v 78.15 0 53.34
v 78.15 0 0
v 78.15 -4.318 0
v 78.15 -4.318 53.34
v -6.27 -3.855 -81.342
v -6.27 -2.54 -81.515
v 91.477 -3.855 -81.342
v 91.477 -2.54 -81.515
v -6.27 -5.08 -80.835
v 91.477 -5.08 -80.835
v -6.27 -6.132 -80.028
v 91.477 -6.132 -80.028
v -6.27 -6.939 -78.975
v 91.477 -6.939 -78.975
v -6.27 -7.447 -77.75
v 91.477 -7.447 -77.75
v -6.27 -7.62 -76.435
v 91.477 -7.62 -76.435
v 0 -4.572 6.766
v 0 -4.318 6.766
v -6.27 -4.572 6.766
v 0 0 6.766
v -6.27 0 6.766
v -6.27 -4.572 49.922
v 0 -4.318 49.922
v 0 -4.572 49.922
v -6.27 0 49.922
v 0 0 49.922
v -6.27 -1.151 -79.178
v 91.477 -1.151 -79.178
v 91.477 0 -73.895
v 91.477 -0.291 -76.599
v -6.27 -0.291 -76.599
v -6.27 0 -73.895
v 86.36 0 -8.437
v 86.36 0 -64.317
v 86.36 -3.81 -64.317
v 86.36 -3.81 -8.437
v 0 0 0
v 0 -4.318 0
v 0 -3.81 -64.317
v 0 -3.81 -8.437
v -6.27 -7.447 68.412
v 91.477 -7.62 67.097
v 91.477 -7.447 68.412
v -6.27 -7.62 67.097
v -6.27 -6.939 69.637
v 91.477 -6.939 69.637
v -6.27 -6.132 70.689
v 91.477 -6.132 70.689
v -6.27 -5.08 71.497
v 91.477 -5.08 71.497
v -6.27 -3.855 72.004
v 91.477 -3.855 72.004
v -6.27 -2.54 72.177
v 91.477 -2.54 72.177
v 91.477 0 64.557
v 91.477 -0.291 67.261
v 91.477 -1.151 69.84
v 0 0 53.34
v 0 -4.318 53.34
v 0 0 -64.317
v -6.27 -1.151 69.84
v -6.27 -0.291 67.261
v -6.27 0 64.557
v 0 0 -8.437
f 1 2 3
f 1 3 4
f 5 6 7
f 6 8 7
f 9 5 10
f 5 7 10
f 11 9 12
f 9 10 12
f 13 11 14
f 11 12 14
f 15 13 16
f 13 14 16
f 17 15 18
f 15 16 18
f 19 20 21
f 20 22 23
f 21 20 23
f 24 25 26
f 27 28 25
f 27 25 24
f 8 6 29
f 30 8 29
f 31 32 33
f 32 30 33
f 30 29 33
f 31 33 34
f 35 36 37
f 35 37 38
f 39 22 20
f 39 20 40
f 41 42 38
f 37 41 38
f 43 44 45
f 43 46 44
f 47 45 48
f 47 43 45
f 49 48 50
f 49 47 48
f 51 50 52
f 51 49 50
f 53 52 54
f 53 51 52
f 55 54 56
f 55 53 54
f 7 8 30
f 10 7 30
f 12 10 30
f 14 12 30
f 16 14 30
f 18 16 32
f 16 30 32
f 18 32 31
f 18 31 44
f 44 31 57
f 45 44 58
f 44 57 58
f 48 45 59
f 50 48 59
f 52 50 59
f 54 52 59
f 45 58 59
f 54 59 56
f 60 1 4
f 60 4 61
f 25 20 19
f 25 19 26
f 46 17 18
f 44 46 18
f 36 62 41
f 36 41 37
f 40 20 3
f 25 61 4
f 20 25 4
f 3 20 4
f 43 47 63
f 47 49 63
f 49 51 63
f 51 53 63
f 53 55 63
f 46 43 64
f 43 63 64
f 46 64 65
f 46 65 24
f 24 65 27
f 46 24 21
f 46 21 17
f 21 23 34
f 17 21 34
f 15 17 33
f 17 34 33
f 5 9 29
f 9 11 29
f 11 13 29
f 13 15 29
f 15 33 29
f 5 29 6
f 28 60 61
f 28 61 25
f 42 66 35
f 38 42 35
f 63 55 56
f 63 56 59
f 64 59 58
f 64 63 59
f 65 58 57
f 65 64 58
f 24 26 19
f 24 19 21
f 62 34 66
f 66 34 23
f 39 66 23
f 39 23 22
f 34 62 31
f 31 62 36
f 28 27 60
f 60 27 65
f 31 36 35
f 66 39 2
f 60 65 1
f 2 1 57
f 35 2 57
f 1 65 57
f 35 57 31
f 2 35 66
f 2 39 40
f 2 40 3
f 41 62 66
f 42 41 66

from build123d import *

# Parameters (mm, degrees)
F3_DEPTH     = 7.62
F4_DEPTH     = 4.318
F1_W         = 86.36
F1_H         = 55.88
F5_DEPTH     = 3.81
F6_W         = 6.2699629925
F6_H         = 43.1555788964
F7_DEPTH     = 4.572
F8_R         = 5.08
F9_T1_DEPTH  = 135.8469622158
F10_R        = 5.08
F11_T1_DEPTH = 135.8469622158


# Not quite as in the source:
# - a fillet or chamfer that OpenCascade refuses, or shapes differently, is made with other operations: its cross-section is extruded or revolved along the edge and cut away or added


with BuildPart() as f3:
    # F2 (on Front) → F3 (new body)
    with BuildSketch(Plane.XZ):
        Polygon((-6.2699629925, 72.1773862183), (-6.2699629925, 59.4773862183), (-6.2699629925, -68.8154984593), (-6.2699629925, -81.5154984593), (91.4769992232, -81.5154984593), (91.4769992232, -68.8154984593), (91.4769992232, 59.4773862183), (91.4769992232, 72.1773862183), align=None)
    extrude(amount=F3_DEPTH)

    # F0 (on Front) → F4 (cut)
    with BuildSketch(Plane.XZ):
        Polygon((0, 53.34), (0, 0), (66.5871798992, 0), (70.5303996801, 0), (78.1503996801, 0), (78.1503996801, 53.34), (70.5303996801, 53.34), (64.516, 53.34), align=None)
    extrude(amount=F4_DEPTH, mode=Mode.SUBTRACT)

    # F1 (on Front) → F5 (cut)
    with BuildSketch(Plane.XZ):
        with Locations((43.18, -36.3771444535)):
            Rectangle(F1_W, F1_H)
    extrude(amount=F5_DEPTH, mode=Mode.SUBTRACT)

    # F6 (on face) → F7 (cut)
    with BuildSketch(Plane(origin=(0, 0, 0), x_dir=(-1, 0, 0), z_dir=(0, 1, 0))):
        with Locations((3.1349814963, 28.3439913765)):
            Rectangle(F6_W, F6_H)
    extrude(amount=-F7_DEPTH, mode=Mode.SUBTRACT)

    # F8
    f8_edges = [f3.edges().sort_by_distance(p)[0] for p in [
        (42.603518, -7.62, -81.515498),
    ]]
    fillet(f8_edges, radius=F8_R)

    # F9: fillet of radius 12.7 on 1 edges, made by hand

    # F9_s2 → F9_t1 (cut)
    with BuildSketch(Plane.YZ.offset(-25.3199629925)):
        with BuildLine():
            ThreePointArc((-2.54, -81.5154984593), (-0.6517221148, -77.9115910878), (0, -73.8954984593))
            Line((0, -73.8954984593), (0, -81.5154984593))
            Line((0, -81.5154984593), (-2.54, -81.5154984593))
        make_face()
    extrude(amount=F9_T1_DEPTH, mode=Mode.SUBTRACT)

    # F10
    f10_edges = [f3.edges().sort_by_distance(p)[0] for p in [
        (42.603518, -7.62, 72.177386),
    ]]
    fillet(f10_edges, radius=F10_R)

    # F11: fillet of radius 12.7 on 1 edges, made by hand

    # F11_s2 → F11_t1 (cut)
    with BuildSketch(Plane.YZ.offset(-25.3199629925)):
        with BuildLine():
            ThreePointArc((-2.54, 72.1773862183), (-0.6517221148, 68.5734788467), (0, 64.5573862183))
            Line((0, 64.5573862183), (0, 72.1773862183))
            Line((0, 72.1773862183), (-2.54, 72.1773862183))
        make_face()
    extrude(amount=F11_T1_DEPTH, mode=Mode.SUBTRACT)


solid = f3.part
